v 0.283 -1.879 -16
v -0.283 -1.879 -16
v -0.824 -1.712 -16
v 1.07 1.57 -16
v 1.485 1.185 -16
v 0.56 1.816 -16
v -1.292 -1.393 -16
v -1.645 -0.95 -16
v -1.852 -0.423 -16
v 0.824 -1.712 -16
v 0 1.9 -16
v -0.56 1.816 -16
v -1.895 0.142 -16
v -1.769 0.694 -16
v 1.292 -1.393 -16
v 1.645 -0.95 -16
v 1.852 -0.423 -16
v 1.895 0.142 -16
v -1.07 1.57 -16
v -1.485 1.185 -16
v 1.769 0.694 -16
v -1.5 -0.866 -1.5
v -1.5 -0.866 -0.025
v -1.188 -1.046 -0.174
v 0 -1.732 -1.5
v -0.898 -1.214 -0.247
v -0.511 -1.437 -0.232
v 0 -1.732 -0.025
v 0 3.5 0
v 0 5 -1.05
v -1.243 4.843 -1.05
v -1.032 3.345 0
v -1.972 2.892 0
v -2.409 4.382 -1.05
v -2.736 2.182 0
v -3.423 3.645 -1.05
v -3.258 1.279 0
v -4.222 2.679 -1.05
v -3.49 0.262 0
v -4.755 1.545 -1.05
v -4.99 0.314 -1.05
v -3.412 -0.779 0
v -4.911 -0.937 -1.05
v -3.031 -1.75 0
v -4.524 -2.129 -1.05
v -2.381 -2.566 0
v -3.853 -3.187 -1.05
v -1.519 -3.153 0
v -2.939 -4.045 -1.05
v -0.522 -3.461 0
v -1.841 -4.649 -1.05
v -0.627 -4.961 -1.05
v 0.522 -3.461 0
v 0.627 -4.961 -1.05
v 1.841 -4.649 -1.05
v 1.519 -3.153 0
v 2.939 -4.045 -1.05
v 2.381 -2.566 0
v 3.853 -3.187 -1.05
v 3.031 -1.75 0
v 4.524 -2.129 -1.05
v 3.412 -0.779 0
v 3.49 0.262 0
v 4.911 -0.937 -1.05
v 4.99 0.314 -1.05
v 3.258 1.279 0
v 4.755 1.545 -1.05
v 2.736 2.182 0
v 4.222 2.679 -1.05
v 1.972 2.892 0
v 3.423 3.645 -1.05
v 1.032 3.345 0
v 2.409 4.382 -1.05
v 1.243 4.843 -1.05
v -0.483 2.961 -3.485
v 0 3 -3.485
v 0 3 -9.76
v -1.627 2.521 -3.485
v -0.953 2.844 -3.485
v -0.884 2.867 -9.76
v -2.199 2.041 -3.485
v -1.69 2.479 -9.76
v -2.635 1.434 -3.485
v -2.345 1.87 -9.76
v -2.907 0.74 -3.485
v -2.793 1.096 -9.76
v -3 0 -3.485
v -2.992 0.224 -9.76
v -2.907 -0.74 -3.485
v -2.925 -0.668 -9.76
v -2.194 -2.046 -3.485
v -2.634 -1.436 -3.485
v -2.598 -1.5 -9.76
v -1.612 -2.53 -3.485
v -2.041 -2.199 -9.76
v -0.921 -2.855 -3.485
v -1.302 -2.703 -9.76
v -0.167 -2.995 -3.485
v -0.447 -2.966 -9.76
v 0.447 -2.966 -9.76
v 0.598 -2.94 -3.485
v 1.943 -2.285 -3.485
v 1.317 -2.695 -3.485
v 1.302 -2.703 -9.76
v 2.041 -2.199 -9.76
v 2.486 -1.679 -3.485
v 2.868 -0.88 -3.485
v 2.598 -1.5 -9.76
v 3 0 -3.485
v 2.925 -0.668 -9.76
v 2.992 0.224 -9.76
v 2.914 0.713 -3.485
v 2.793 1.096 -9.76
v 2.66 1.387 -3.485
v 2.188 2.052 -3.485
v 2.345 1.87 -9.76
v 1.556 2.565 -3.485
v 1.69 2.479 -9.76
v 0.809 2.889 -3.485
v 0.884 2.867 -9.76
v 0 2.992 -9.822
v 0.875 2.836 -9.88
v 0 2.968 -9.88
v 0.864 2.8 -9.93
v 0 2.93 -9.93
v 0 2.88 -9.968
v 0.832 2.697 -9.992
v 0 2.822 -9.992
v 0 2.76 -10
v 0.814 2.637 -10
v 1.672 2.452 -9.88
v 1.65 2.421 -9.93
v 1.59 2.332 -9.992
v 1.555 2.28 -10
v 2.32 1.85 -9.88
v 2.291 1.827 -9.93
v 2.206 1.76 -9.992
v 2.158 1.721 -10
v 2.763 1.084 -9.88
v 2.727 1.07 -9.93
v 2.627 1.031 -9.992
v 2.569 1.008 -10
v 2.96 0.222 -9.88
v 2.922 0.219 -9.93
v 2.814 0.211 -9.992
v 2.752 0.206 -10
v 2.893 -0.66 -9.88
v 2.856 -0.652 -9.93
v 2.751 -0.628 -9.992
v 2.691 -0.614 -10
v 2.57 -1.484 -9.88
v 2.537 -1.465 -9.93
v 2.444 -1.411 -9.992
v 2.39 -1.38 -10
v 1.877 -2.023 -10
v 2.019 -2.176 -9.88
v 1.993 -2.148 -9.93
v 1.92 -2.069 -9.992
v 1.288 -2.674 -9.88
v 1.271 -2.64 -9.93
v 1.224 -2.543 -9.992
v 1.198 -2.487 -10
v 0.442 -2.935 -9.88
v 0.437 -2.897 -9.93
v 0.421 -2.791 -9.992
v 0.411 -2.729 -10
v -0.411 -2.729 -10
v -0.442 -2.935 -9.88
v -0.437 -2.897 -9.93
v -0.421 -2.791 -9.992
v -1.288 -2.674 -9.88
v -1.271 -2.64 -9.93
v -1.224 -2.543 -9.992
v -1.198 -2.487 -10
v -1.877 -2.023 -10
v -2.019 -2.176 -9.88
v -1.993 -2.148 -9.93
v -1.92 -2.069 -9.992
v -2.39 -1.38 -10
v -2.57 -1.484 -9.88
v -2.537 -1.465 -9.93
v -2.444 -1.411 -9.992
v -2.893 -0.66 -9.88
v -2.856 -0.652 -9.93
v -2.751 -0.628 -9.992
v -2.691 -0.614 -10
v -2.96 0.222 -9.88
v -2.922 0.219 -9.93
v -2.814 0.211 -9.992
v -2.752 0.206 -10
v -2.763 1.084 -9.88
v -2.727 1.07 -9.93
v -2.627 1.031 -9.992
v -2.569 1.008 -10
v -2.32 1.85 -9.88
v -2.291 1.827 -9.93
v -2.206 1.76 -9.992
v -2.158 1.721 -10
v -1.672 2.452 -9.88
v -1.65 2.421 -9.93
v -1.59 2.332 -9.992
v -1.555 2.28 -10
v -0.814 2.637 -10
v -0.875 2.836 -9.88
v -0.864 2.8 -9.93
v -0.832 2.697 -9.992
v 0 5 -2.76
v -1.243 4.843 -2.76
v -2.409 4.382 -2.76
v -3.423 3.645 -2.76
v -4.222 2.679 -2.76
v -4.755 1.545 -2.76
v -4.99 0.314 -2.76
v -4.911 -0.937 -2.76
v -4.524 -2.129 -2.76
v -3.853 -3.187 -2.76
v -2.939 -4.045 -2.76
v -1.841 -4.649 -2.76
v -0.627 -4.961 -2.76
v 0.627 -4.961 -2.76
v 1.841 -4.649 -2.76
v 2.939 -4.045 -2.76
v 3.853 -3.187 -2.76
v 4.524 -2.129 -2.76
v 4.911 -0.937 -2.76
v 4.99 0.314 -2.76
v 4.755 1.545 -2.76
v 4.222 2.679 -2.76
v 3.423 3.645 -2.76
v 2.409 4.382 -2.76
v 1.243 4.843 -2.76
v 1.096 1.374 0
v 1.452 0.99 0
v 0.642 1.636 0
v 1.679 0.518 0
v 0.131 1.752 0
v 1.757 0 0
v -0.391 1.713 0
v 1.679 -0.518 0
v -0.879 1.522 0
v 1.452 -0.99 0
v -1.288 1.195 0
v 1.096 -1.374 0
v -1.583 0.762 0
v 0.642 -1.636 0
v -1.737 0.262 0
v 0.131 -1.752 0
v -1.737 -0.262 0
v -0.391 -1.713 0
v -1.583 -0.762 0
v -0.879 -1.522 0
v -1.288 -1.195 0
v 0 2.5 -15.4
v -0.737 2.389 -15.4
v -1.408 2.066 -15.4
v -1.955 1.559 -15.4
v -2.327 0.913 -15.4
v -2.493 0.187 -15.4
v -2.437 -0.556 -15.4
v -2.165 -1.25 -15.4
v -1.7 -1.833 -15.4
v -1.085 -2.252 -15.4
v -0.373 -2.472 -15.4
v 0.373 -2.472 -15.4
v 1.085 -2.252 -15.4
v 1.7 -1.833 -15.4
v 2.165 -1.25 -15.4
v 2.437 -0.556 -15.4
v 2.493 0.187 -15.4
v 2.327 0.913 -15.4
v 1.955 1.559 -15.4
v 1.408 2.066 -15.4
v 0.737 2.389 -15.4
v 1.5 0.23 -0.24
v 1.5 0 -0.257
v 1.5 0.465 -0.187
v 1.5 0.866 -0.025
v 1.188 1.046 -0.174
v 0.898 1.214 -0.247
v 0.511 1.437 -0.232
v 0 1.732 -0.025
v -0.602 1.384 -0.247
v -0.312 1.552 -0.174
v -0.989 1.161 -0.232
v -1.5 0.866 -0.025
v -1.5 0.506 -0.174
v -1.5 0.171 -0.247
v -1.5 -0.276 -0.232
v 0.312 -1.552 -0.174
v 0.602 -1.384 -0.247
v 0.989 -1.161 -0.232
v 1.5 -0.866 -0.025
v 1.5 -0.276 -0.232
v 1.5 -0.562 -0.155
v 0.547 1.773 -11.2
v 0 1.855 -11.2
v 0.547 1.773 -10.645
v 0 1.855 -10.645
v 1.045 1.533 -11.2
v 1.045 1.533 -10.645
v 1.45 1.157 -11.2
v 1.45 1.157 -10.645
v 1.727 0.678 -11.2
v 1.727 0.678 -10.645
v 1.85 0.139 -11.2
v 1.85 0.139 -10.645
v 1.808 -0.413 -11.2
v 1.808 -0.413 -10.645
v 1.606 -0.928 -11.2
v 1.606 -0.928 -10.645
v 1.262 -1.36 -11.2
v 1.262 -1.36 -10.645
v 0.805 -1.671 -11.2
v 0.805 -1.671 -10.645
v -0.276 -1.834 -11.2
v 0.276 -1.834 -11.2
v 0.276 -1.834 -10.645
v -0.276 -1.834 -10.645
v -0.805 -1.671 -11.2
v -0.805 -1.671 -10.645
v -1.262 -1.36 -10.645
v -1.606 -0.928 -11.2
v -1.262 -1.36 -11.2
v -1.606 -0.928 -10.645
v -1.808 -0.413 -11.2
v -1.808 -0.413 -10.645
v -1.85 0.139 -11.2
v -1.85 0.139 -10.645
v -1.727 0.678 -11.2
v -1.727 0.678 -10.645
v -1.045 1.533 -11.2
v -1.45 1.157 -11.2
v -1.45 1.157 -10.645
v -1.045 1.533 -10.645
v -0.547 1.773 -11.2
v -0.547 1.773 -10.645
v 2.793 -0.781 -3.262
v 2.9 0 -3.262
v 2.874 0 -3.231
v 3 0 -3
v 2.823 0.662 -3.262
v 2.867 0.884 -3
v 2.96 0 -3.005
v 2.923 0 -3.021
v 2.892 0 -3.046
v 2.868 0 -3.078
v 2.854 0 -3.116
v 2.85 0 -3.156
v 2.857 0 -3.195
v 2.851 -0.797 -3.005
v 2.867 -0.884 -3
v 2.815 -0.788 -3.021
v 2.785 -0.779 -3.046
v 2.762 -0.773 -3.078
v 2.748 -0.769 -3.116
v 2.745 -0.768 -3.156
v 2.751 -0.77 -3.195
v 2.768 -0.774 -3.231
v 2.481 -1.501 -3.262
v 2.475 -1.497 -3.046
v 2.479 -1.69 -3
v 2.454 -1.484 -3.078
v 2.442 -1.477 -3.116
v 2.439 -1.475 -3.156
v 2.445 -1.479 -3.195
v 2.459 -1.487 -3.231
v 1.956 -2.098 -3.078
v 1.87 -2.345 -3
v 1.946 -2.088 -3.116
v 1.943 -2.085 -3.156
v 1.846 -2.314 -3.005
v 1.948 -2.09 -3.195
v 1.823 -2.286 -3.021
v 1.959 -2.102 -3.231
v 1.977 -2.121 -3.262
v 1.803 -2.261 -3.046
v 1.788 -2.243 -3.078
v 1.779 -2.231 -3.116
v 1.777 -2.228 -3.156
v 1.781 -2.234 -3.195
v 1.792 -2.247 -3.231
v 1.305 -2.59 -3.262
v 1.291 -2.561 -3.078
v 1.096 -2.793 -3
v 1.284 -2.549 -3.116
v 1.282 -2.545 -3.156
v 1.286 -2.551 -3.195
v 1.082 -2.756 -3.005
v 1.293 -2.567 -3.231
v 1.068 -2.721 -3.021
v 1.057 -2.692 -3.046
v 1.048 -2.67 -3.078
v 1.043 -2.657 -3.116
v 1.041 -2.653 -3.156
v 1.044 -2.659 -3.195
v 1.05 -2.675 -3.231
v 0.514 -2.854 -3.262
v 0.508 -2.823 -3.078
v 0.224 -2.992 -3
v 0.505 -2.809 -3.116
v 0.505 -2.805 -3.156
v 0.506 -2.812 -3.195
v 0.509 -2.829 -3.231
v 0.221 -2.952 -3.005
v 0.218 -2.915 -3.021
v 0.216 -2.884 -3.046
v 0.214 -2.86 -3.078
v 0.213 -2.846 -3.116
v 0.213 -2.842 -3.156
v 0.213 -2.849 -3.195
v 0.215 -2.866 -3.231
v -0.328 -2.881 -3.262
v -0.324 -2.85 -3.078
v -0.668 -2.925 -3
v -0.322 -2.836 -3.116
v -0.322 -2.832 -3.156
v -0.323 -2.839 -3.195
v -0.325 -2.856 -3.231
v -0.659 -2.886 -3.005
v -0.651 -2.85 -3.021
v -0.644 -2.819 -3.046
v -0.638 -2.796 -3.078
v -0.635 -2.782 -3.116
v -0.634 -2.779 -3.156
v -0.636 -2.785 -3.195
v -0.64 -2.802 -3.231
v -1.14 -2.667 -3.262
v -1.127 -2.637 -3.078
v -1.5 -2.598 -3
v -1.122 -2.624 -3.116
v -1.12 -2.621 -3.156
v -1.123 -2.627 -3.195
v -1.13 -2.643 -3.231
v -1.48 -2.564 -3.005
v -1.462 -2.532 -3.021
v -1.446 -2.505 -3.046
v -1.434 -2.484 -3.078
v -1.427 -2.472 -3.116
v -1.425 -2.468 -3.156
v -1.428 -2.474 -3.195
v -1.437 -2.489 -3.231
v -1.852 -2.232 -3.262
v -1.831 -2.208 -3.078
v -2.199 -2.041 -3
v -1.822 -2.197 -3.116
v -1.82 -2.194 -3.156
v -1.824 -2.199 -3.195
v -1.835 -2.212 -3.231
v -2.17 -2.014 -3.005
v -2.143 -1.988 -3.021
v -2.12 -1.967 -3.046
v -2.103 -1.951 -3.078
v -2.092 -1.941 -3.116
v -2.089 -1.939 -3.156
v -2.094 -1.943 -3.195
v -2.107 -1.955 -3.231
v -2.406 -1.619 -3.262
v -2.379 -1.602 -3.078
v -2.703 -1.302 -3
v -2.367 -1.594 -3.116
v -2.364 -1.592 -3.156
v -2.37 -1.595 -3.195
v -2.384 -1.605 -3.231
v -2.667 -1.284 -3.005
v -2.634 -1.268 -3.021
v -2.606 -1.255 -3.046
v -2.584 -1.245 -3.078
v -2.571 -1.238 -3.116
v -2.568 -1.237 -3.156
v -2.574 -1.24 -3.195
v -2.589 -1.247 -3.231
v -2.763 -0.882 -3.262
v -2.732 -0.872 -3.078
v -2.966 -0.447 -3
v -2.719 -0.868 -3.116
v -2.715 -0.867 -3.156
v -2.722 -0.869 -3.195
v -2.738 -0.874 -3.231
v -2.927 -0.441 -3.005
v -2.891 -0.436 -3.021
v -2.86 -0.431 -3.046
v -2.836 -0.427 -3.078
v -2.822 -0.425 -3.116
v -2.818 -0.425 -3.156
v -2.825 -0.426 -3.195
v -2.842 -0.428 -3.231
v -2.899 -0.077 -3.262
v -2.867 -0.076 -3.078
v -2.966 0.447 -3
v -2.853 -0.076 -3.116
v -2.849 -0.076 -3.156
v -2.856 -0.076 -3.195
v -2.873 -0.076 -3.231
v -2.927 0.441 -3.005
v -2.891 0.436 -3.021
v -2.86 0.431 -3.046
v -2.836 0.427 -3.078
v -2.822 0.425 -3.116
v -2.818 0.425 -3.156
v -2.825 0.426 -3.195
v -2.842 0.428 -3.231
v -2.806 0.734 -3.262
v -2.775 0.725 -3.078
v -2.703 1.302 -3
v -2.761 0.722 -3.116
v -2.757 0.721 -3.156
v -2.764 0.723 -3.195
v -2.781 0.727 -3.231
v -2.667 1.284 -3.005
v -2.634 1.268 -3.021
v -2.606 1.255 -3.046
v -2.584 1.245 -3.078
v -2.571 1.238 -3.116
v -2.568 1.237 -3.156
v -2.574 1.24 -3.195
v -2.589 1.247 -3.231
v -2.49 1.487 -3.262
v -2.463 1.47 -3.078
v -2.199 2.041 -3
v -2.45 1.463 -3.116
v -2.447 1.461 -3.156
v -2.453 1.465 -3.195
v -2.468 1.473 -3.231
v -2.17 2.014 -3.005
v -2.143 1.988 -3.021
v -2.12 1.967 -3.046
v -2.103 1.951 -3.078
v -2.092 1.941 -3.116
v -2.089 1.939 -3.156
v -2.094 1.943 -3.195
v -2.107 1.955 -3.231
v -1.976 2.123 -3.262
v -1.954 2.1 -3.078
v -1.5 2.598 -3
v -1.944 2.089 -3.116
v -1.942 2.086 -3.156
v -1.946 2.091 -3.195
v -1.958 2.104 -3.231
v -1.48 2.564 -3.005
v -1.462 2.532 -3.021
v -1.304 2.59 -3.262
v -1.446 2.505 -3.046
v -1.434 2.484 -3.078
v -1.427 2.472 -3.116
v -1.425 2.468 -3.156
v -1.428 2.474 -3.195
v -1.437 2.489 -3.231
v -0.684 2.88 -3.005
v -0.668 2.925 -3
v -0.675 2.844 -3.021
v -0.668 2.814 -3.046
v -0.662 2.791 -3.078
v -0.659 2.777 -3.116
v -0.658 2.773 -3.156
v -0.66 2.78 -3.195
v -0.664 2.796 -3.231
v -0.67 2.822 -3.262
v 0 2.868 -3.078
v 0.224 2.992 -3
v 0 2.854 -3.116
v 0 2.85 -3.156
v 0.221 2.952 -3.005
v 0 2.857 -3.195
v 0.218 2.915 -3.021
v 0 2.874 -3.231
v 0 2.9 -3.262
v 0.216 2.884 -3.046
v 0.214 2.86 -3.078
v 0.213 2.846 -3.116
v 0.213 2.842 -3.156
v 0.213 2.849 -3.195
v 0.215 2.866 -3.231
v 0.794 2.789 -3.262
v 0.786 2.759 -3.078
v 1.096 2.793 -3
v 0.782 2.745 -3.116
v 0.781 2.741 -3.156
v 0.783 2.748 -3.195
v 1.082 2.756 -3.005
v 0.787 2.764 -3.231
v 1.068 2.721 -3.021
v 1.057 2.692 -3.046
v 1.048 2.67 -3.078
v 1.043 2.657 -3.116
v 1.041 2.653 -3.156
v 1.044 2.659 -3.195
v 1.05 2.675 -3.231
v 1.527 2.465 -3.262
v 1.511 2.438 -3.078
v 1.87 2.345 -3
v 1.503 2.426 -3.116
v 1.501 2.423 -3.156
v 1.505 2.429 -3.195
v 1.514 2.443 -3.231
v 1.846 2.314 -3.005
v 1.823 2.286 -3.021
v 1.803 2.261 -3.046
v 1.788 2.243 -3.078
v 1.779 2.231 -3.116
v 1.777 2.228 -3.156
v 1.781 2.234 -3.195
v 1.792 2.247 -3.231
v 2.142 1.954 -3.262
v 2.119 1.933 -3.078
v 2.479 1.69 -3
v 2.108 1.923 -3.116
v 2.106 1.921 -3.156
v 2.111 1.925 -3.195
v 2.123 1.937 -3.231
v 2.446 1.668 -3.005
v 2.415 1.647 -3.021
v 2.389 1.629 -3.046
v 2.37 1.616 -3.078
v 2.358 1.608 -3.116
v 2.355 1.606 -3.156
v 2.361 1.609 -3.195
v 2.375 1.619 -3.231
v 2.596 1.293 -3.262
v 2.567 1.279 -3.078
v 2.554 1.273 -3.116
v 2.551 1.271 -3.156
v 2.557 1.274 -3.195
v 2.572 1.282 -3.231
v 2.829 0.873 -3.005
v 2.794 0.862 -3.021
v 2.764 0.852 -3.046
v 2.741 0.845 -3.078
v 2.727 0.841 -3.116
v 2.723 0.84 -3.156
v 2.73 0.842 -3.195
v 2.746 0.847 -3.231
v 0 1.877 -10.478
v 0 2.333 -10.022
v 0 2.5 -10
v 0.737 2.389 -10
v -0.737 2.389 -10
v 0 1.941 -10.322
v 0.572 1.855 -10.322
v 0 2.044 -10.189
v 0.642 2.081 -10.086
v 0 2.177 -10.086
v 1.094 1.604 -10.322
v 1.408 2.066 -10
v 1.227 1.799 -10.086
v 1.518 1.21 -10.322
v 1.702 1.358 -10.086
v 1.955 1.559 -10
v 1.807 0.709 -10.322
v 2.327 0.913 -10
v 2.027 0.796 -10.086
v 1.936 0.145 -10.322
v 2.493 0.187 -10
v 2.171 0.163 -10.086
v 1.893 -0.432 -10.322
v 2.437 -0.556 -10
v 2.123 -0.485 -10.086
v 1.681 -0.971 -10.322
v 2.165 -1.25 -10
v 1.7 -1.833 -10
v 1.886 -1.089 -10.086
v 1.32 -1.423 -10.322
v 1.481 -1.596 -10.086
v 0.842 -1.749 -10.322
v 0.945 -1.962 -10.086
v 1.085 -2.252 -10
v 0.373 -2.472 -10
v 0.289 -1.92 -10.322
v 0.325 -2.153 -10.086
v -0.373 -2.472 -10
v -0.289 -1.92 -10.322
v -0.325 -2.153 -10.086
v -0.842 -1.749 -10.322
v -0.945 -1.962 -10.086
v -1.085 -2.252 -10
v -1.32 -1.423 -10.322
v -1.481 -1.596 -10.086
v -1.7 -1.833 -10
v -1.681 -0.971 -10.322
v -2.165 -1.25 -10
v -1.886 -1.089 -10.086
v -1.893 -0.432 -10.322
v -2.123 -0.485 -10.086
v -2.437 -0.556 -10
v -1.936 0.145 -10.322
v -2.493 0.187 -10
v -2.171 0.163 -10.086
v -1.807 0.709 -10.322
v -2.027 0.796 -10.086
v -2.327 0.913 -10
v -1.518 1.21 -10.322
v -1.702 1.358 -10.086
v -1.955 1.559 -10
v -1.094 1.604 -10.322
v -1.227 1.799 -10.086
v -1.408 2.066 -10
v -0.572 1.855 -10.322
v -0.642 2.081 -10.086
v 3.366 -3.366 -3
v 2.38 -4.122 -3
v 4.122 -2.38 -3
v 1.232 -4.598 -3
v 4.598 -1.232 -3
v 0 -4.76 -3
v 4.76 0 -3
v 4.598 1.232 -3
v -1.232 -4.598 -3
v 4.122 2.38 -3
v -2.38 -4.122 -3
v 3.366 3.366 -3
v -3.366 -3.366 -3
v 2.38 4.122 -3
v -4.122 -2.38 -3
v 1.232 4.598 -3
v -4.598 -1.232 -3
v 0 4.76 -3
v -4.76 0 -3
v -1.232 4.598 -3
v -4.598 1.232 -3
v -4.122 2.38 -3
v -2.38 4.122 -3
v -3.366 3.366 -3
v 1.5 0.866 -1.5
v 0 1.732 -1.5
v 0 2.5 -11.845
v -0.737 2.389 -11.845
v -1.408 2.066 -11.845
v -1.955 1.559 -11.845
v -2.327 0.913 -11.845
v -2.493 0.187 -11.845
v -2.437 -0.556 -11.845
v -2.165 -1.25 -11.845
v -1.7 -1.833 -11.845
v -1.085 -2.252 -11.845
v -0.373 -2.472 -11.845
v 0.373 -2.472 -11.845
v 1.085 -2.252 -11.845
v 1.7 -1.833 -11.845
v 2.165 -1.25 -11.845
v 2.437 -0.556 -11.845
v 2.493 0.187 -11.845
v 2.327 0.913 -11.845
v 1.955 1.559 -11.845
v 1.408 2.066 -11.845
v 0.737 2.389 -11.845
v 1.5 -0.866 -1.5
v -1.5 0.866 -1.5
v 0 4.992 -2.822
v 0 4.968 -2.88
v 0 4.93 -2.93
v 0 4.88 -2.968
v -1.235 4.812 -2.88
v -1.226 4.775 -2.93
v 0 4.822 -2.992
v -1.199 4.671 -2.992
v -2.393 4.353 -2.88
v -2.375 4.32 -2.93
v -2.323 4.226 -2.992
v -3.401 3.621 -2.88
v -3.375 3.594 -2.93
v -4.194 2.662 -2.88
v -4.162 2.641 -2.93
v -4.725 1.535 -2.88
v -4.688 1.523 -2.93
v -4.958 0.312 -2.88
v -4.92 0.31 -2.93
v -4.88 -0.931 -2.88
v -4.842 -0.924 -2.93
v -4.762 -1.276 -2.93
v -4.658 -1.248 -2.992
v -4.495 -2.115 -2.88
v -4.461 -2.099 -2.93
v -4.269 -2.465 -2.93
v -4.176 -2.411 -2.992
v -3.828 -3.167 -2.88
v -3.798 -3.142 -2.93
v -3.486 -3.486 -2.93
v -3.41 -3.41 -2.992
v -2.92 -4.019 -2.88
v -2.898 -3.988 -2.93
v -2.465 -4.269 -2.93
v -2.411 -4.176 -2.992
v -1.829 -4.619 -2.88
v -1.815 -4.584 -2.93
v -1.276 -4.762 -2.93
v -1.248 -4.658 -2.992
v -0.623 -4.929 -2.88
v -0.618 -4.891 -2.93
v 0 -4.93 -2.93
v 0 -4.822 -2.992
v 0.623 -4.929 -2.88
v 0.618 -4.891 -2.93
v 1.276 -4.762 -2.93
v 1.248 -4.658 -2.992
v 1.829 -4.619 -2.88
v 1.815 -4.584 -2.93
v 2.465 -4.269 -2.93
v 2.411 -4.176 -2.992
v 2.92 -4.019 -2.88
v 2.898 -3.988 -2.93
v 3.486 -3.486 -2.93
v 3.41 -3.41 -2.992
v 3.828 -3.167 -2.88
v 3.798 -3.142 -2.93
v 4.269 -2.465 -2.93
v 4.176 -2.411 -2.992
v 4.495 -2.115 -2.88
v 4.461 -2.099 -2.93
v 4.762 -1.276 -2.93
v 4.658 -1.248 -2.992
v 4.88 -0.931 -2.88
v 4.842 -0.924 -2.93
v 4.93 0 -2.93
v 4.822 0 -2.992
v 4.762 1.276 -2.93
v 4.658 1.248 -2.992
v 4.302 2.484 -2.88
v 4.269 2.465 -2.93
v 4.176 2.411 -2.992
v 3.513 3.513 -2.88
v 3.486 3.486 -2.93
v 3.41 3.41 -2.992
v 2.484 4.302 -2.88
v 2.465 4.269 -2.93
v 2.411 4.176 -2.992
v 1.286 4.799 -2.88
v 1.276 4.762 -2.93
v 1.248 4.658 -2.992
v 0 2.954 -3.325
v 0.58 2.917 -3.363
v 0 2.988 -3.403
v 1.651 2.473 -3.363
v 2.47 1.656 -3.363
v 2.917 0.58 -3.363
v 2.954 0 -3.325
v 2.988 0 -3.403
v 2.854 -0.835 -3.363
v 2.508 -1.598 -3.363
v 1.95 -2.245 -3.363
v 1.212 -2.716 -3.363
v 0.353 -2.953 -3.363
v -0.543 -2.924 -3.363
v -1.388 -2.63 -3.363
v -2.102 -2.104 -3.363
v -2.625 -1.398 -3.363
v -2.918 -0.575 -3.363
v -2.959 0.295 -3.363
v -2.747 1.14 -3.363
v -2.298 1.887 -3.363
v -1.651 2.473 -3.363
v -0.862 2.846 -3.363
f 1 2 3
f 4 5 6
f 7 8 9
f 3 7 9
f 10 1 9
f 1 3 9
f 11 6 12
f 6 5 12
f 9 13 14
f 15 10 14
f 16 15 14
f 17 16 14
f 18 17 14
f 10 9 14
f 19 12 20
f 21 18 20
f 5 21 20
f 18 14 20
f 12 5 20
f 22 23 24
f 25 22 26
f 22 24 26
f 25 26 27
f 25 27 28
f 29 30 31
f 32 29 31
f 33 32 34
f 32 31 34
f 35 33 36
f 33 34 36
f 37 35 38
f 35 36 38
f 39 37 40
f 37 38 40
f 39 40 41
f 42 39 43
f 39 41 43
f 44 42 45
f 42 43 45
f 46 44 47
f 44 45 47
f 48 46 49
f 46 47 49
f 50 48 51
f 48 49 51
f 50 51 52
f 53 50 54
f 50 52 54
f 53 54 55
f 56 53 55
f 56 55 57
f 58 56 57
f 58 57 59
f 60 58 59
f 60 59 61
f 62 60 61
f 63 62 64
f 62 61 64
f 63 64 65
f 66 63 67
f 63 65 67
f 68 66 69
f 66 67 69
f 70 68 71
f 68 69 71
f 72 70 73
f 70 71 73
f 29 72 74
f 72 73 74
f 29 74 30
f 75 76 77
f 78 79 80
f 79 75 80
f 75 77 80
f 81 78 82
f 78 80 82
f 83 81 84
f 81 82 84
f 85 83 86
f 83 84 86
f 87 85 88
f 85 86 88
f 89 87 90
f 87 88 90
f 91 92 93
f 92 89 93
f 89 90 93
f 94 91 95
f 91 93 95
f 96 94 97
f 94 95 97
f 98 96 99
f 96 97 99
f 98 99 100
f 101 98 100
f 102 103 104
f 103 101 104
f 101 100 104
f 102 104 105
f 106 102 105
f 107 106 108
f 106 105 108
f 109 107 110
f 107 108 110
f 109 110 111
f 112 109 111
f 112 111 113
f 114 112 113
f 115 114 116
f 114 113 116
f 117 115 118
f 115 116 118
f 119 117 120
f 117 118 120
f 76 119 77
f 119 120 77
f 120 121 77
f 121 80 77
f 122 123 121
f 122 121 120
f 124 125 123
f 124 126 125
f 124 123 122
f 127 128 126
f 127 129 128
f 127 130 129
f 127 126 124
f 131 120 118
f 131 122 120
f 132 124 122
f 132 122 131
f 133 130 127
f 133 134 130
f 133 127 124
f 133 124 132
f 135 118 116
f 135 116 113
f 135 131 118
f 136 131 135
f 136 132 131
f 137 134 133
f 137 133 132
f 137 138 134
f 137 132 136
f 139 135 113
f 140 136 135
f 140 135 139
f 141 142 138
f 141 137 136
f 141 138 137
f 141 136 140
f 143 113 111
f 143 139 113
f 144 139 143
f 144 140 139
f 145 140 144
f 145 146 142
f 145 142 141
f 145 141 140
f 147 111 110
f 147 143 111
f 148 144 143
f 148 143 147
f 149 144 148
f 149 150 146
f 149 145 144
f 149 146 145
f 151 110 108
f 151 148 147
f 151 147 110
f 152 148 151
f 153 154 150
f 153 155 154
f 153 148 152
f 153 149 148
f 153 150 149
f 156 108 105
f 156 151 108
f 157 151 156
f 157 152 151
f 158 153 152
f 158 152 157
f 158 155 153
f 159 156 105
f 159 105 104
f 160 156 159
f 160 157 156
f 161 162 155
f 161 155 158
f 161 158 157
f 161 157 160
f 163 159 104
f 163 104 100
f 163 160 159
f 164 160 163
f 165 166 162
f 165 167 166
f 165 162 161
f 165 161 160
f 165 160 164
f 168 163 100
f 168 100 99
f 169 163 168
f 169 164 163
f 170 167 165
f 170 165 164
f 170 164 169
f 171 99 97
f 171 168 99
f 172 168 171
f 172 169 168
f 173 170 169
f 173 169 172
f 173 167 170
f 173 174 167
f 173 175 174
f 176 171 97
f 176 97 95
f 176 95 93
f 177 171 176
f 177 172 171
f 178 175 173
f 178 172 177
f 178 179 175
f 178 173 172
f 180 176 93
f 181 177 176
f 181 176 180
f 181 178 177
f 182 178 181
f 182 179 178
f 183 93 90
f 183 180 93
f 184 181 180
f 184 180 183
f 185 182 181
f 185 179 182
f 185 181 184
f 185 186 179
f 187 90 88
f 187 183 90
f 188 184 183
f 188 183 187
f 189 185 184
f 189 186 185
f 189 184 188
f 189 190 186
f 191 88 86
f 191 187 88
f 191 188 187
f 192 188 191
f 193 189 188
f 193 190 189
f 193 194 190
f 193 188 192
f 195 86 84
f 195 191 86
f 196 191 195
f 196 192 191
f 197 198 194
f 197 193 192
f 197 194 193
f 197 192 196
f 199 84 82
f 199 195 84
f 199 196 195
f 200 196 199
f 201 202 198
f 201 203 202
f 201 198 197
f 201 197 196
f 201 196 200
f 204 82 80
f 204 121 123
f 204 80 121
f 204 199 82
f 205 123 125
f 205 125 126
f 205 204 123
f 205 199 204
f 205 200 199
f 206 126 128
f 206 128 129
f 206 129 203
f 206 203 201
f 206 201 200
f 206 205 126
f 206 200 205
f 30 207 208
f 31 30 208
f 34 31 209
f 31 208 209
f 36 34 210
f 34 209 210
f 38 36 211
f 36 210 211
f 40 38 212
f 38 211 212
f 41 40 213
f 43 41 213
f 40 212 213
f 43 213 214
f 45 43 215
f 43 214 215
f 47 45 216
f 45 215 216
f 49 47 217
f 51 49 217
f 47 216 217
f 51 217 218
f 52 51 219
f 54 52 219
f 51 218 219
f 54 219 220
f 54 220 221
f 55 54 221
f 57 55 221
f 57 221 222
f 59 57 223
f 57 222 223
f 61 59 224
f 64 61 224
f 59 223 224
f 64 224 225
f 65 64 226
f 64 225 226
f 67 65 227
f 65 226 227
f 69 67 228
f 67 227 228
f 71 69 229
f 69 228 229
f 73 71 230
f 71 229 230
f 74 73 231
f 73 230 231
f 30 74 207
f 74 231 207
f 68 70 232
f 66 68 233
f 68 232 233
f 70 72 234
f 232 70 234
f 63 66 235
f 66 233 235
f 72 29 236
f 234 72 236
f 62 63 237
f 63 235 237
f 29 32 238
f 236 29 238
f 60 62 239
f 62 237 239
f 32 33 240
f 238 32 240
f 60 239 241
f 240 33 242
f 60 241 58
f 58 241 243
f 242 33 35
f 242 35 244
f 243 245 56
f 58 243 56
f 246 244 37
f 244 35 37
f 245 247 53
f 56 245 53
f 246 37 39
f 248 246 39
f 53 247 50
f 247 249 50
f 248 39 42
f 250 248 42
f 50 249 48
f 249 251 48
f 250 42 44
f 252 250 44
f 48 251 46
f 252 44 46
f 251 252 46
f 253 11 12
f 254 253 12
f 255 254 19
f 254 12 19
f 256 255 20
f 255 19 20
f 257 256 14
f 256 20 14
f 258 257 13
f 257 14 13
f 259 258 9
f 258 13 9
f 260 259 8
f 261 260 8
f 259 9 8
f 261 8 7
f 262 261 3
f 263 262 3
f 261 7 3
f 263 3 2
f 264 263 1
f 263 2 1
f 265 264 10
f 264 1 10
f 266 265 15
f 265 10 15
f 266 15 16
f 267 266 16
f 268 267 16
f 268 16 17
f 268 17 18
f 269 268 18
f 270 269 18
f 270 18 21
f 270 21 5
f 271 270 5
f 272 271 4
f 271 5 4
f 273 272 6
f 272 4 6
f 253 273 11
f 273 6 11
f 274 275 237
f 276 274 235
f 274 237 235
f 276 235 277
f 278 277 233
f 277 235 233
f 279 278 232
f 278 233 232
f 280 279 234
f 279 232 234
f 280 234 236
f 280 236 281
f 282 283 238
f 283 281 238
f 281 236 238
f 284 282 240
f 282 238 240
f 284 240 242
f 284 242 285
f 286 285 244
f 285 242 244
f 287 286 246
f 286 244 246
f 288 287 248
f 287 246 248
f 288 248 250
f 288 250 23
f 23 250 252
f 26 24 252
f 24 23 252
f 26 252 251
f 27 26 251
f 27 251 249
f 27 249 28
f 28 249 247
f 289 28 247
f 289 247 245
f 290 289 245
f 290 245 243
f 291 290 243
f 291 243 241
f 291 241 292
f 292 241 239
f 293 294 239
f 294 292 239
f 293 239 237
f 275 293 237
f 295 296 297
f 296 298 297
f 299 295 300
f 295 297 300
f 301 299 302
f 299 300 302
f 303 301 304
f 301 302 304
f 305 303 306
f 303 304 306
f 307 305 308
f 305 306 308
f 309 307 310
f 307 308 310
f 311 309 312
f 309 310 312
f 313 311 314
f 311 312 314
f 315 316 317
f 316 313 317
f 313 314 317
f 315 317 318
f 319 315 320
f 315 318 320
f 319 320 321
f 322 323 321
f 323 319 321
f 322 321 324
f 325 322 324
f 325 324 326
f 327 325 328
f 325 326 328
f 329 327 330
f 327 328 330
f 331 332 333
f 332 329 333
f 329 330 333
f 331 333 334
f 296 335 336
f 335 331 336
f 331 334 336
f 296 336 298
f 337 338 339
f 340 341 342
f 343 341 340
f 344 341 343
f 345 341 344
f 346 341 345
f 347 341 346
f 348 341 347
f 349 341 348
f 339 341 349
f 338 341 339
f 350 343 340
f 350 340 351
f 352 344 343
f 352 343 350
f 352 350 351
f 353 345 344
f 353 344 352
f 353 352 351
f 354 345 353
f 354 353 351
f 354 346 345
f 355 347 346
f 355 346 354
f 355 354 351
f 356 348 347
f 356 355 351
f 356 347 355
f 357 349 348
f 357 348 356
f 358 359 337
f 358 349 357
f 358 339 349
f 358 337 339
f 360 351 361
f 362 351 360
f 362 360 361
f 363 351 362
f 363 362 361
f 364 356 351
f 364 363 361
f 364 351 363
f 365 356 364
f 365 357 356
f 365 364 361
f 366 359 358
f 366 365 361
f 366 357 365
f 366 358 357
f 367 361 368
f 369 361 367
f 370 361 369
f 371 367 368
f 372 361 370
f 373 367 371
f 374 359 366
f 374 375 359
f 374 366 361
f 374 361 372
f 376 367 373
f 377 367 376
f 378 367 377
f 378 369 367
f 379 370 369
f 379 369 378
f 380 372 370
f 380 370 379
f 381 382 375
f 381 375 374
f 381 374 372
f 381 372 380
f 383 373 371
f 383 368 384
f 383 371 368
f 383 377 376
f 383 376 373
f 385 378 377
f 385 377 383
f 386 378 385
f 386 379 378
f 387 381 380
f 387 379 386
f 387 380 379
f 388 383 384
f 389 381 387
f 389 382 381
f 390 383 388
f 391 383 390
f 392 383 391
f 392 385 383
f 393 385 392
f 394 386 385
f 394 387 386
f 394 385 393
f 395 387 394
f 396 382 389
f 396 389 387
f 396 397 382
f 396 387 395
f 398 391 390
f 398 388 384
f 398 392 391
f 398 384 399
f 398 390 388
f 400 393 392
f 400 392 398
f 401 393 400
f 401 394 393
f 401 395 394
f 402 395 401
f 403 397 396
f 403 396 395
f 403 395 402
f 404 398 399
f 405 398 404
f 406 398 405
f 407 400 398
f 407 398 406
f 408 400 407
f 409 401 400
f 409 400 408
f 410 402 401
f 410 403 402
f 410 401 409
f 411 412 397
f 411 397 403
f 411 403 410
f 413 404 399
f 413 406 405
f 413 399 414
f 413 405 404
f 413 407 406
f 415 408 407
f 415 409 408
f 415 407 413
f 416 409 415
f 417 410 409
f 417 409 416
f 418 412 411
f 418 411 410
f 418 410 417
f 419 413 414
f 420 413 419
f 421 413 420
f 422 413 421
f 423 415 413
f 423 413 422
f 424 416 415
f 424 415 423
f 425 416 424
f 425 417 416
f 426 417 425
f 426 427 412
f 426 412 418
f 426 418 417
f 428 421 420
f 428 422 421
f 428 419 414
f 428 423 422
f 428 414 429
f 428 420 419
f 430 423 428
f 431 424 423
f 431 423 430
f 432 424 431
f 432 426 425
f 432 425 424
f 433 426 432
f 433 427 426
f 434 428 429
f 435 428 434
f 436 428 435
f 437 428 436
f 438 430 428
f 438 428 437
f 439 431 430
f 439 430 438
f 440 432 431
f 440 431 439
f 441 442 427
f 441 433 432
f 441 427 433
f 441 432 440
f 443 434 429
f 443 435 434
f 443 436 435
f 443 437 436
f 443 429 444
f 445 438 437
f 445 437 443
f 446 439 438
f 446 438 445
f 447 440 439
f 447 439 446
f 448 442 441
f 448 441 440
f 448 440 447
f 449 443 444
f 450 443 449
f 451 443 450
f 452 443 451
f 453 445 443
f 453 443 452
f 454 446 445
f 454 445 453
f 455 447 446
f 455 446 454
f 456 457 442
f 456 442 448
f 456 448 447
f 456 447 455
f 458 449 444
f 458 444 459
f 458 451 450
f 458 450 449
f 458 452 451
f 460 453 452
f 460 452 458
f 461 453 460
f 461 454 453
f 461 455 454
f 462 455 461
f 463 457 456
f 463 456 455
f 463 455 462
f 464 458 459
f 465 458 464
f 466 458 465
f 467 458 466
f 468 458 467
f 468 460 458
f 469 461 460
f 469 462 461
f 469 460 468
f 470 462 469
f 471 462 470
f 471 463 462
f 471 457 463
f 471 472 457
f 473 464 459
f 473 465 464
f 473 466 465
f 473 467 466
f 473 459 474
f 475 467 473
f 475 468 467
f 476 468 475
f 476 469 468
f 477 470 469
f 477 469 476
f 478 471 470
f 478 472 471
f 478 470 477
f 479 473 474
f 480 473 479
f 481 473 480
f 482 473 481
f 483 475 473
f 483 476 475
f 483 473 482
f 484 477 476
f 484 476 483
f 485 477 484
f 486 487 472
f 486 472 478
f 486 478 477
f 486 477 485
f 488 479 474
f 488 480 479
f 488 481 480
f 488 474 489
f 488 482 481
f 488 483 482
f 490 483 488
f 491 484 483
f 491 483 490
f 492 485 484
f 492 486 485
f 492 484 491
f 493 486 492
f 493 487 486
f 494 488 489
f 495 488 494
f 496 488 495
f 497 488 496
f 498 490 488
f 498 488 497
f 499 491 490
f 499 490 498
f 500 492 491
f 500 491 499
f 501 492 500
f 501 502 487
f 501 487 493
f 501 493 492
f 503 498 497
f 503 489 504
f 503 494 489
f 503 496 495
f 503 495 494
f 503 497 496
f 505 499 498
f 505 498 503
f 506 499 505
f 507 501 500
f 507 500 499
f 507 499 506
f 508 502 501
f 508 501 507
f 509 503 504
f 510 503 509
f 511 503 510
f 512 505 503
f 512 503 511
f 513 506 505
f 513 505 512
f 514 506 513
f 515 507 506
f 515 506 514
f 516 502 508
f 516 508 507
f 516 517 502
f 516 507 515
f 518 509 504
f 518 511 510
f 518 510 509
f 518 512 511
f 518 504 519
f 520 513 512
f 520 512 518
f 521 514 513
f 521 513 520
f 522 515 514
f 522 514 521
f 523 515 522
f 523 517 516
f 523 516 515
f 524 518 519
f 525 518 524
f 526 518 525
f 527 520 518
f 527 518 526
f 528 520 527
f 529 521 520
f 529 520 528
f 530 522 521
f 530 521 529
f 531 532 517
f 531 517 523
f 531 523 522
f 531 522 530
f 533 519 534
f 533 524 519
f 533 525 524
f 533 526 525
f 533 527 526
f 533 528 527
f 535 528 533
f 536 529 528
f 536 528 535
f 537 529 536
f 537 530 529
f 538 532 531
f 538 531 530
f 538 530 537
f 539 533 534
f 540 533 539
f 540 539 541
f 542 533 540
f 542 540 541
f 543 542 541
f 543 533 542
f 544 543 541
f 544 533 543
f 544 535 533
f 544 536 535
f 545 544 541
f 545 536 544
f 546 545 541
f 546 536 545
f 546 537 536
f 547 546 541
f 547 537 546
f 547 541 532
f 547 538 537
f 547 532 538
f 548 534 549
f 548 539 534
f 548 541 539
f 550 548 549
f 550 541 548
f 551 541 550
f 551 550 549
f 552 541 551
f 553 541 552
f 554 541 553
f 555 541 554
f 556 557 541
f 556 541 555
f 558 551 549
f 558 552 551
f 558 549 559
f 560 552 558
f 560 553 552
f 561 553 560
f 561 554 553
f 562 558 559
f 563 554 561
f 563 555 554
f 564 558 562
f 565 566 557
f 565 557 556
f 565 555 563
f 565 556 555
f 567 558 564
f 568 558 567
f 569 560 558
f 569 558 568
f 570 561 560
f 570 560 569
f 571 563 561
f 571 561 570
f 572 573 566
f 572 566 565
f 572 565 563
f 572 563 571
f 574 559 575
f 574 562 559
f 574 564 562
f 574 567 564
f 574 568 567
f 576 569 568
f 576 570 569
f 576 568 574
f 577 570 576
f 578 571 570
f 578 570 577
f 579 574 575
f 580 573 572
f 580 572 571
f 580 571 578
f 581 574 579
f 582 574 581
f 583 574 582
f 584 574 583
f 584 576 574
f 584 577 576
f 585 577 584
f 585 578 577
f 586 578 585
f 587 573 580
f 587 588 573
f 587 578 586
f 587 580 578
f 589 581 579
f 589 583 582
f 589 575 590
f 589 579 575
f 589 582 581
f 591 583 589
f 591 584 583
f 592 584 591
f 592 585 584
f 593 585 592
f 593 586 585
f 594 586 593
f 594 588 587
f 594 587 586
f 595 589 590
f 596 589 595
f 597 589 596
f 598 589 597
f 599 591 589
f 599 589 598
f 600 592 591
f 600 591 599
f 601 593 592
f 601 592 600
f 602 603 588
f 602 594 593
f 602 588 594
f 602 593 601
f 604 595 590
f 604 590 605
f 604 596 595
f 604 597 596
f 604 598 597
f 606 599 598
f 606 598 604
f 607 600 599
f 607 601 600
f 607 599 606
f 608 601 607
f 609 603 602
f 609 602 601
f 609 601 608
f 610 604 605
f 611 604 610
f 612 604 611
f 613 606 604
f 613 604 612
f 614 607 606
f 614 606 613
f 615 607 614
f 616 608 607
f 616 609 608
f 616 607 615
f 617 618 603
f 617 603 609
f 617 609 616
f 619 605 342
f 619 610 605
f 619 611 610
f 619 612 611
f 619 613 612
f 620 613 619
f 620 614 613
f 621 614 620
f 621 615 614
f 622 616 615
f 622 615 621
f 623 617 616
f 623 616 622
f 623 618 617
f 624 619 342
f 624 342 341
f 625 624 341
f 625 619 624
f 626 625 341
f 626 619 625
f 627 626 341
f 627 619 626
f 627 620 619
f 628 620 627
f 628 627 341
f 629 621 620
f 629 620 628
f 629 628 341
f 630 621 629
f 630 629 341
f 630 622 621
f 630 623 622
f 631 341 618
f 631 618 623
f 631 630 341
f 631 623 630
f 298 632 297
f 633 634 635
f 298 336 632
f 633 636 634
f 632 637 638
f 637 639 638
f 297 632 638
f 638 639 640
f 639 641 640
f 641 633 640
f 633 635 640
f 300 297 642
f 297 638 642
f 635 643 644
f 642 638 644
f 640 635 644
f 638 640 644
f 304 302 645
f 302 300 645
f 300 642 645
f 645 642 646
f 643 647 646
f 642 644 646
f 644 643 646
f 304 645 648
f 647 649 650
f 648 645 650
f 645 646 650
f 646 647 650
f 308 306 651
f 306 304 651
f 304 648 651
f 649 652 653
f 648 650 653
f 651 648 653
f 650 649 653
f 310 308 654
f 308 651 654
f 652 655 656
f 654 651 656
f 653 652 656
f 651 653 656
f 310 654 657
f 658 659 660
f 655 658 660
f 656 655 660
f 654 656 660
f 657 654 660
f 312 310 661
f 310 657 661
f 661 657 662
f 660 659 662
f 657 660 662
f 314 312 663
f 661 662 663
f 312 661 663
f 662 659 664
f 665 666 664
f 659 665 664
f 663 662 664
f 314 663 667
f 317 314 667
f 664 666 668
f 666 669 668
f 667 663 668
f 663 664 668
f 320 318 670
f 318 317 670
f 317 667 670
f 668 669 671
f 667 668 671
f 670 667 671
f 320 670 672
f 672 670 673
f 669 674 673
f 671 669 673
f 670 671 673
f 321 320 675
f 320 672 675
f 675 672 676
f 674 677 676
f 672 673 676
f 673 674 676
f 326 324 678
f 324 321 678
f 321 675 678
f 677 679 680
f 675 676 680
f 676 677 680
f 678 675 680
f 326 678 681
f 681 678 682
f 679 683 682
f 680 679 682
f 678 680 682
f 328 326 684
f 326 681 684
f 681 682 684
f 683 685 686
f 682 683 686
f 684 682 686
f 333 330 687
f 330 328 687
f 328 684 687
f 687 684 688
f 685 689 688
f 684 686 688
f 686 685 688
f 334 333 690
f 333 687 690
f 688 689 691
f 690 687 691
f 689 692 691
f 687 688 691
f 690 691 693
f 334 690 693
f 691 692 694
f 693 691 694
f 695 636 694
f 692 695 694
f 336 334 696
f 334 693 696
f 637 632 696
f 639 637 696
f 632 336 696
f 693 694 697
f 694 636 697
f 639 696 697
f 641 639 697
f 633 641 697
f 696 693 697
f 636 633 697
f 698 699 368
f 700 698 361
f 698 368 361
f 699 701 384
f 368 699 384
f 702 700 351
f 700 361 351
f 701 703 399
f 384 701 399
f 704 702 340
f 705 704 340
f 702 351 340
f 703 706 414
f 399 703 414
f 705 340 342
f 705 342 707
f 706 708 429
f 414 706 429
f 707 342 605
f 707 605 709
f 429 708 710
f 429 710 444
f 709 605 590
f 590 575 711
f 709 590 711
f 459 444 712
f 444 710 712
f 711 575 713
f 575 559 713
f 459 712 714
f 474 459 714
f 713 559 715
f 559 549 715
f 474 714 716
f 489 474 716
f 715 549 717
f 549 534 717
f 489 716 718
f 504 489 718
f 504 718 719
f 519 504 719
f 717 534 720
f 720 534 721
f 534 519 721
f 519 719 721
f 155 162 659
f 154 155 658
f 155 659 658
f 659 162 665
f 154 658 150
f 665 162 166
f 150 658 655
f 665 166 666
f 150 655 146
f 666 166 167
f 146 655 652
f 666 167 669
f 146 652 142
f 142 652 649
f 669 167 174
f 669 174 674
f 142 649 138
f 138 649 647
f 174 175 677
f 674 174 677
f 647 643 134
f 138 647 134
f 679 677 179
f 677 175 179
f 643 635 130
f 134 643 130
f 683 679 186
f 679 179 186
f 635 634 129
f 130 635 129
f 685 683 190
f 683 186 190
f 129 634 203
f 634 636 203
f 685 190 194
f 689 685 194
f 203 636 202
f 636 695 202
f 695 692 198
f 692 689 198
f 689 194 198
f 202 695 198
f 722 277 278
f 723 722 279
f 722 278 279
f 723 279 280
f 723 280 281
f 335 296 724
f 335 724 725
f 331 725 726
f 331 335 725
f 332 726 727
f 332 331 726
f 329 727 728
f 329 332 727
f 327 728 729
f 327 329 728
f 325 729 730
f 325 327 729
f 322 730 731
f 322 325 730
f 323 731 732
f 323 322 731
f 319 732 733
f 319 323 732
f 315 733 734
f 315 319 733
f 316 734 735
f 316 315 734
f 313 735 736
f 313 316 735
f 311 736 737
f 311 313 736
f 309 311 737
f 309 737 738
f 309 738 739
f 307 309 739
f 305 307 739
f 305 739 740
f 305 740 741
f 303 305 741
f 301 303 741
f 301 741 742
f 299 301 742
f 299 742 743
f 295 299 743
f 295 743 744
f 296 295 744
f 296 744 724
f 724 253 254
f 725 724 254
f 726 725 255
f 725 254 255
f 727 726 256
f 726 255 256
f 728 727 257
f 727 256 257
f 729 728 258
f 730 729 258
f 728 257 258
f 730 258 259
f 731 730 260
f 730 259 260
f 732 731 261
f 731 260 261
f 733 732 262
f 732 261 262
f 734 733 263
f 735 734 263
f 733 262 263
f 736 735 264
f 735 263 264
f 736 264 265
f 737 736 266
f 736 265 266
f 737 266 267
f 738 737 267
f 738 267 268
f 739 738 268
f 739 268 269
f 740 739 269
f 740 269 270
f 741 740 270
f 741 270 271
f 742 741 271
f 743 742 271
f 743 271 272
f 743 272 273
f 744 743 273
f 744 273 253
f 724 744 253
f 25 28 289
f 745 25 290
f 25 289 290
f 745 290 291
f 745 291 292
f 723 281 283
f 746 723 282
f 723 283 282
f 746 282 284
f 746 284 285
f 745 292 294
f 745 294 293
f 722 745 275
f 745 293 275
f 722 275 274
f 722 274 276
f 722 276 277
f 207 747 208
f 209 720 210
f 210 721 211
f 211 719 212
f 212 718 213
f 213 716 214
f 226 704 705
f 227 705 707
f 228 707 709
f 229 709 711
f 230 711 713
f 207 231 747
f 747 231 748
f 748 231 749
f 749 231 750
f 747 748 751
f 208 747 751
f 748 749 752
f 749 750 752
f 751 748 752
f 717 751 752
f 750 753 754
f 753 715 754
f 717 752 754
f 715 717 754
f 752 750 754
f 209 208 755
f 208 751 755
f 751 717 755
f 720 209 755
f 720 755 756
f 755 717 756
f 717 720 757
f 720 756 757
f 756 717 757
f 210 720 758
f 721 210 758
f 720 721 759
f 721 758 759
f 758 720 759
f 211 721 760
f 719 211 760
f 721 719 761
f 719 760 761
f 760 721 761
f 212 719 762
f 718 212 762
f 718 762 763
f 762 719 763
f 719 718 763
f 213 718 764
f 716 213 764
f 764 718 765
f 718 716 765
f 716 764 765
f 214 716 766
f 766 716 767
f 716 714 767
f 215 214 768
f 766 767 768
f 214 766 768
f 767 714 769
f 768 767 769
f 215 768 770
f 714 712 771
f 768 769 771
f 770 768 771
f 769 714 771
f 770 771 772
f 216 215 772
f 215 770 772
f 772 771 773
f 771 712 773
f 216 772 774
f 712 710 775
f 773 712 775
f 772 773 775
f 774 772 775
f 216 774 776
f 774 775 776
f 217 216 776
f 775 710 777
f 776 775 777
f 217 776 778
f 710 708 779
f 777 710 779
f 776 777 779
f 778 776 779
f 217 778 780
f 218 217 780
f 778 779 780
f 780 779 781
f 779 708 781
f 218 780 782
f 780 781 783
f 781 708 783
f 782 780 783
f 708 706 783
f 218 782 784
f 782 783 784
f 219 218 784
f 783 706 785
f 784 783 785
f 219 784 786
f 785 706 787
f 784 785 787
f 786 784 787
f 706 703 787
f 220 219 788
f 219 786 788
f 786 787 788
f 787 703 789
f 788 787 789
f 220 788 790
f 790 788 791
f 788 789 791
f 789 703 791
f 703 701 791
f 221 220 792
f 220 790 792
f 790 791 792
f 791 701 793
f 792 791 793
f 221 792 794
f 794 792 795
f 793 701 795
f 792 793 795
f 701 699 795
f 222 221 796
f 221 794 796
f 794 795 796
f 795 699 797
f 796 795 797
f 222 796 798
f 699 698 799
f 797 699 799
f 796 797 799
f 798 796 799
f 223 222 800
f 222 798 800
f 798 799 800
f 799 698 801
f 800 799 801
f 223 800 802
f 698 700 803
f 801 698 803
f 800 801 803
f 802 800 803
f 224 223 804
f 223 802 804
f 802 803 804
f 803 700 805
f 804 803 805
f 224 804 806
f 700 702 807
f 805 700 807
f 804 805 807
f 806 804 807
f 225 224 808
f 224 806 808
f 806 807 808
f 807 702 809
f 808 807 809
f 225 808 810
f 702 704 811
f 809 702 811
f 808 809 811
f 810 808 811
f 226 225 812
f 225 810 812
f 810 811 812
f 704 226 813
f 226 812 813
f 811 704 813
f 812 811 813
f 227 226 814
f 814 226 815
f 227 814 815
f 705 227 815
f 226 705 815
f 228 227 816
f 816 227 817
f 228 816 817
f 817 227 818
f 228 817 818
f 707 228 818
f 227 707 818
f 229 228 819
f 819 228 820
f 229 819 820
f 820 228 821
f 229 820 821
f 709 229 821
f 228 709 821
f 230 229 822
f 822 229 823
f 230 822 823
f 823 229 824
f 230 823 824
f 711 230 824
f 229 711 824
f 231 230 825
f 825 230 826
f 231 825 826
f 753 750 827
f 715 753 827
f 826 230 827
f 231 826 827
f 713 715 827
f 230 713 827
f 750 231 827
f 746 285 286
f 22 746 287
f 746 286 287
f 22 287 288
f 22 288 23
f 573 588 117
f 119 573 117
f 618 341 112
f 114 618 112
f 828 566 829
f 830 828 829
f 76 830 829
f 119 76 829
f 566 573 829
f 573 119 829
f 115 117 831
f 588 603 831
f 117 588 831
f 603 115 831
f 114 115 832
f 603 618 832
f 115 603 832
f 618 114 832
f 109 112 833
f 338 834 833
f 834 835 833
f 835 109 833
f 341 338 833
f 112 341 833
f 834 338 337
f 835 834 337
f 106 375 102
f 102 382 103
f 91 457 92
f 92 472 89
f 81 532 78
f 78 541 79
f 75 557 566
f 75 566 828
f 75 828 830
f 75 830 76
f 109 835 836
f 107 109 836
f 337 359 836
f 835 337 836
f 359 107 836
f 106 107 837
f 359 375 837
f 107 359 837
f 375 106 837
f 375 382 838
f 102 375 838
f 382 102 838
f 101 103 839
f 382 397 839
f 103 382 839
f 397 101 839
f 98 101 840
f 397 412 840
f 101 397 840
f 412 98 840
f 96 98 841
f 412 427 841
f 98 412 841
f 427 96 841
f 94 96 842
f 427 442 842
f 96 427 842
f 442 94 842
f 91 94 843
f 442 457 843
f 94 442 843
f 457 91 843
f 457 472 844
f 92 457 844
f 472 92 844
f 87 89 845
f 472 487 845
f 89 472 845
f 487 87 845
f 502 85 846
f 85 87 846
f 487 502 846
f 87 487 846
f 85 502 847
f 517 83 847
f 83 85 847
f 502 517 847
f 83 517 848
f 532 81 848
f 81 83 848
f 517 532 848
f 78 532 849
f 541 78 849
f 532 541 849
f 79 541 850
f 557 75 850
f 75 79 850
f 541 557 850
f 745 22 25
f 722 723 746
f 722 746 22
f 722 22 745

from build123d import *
from build123d.topology import SkipClean

# Parameters (mm, degrees)
CUT_REVOLVE1_ANGLE = 360
CUT_EXTRUDE2_DEPTH = 1.5
SKETCH9_R          = 1.757050808
CUT_EXTRUDE4_DEPTH = 1.5
CUT_EXTRUDE4_DRAFT = -45
CHAMFER1_SIZE      = 0.6
CHAMFER2_SIZE      = 1.5
CHAMFER2_SIZE2     = 1.050311307
FILLET1_R          = 0.24
SKETCH12_R         = 0.15
FILLET2_R          = 0.3


with BuildPart() as part:
    # Sketch10 → Revolve1 (revolve)
    with BuildSketch(Plane(origin=(0, 0, 0), x_dir=(0, 0, -1), z_dir=(1, 0, 0))):
        Polygon((10, 3), (10, 2.5), (16, 2.5), (16, 0), (0, 0), (0, 5), (3, 5), (3, 3), align=None)
    revolve(axis=Axis((0, 0, -16), (0, 0, 1)))

    # Sketch5 → Cut-Revolve1 (revolve, symmetric, cut)
    with SkipClean():  # the faces are left unmerged after this step: merging them gives an invalid solid
        with BuildSketch(Plane(origin=(0, 0, 0), x_dir=(0, 0, -1), z_dir=(1, 0, 0))) as cut_revolve1_sk:
            with BuildLine():
                Line((10, 3), (12.345, 3))
                Line((12.345, 3), (11.2, 1.855))
                Line((11.2, 1.855), (10.645, 1.855))
                ThreePointArc((10.645, 1.855), (10.188916126, 2.043916126), (10, 2.5))
                Line((10, 2.5), (10, 3))
            make_face()
        revolve(axis=Axis((0, 0, -16), (0, 0, 1)), revolution_arc=CUT_REVOLVE1_ANGLE / 2, mode=Mode.SUBTRACT)
        revolve(cut_revolve1_sk.sketch, axis=Axis((0, 0, -16), (0, 0, -1)), revolution_arc=CUT_REVOLVE1_ANGLE / 2, mode=Mode.SUBTRACT)

    # Sketch8 → Cut-Extrude2 (cut)
    with BuildSketch(Plane.XY):
        Polygon((0, 1.732050808), (-1.5, 0.866025404), (-1.5, -0.866025404), (0, -1.732050808), (1.5, -0.866025404), (1.5, 0.866025404), align=None)
    extrude(amount=-CUT_EXTRUDE2_DEPTH, mode=Mode.SUBTRACT)


with BuildPart() as cut_extrude4_tool:
    # Sketch9 → Cut-Extrude4 (with draft: the straight prism first)
    with BuildSketch(Plane.XY):
        Circle(SKETCH9_R)
    extrude(amount=-CUT_EXTRUDE4_DEPTH)
    # Cut-Extrude4: the draft: its side faces are tilted about the plane it starts from
    cut_extrude4_sides = [cut_extrude4_tool.faces().sort_by_distance(p)[0] for p in [
        (-1.757050808, 0, -0.75),
    ]]
    draft(cut_extrude4_sides, Plane.XY, CUT_EXTRUDE4_DRAFT)


with BuildPart() as part_1:
    add(part.part)

    # Cut-Extrude4: cut by cut_extrude4_tool
    add(cut_extrude4_tool.part, mode=Mode.SUBTRACT)

    # Chamfer1
    chamfer1_edges = [part_1.edges().sort_by_distance(p)[0] for p in [
        (0, -2.5, -16),
    ]]
    chamfer(chamfer1_edges, length=CHAMFER1_SIZE)

    # Chamfer2
    chamfer2_edges = [part_1.edges().sort_by_distance(p)[0] for p in [
        (0, -5, 0),
    ]]
    chamfer2_side = [part_1.faces().sort_by_distance(p)[0] for p in [
        (0, -4.858578644, 0),
    ]]
    chamfer(chamfer2_edges, length=CHAMFER2_SIZE, length2=CHAMFER2_SIZE2, reference=chamfer2_side[0])

    # Fillet1
    fillet1_edges = [part_1.edges().sort_by_distance(p)[0] for p in [
        (0, -5, -3),
        (0, -3, -10),
    ]]
    fillet(fillet1_edges, radius=FILLET1_R)

    # Sketch12 → Cut-Revolve2 (revolve, cut)
    with BuildSketch(Plane(origin=(0, 0, 0), x_dir=(0, 0, -1), z_dir=(1, 0, 0)), mode=Mode.PRIVATE) as cut_revolve2_sk:
        with Locations((3.15, 3)):
            Circle(SKETCH12_R)
    revolve(cut_revolve2_sk.sketch.rotate(Axis((0, 0, 0), (0, 0, -1)), 90), axis=Axis((0, 0, 0), (0, 0, -1)), mode=Mode.SUBTRACT)

    # Fillet2
    fillet2_edges = [part_1.edges().sort_by_distance(p)[0] for p in [
        (2.121320344, 2.121320344, -3.3),
    ]]
    fillet(fillet2_edges, radius=FILLET2_R)


solid = part_1.part
